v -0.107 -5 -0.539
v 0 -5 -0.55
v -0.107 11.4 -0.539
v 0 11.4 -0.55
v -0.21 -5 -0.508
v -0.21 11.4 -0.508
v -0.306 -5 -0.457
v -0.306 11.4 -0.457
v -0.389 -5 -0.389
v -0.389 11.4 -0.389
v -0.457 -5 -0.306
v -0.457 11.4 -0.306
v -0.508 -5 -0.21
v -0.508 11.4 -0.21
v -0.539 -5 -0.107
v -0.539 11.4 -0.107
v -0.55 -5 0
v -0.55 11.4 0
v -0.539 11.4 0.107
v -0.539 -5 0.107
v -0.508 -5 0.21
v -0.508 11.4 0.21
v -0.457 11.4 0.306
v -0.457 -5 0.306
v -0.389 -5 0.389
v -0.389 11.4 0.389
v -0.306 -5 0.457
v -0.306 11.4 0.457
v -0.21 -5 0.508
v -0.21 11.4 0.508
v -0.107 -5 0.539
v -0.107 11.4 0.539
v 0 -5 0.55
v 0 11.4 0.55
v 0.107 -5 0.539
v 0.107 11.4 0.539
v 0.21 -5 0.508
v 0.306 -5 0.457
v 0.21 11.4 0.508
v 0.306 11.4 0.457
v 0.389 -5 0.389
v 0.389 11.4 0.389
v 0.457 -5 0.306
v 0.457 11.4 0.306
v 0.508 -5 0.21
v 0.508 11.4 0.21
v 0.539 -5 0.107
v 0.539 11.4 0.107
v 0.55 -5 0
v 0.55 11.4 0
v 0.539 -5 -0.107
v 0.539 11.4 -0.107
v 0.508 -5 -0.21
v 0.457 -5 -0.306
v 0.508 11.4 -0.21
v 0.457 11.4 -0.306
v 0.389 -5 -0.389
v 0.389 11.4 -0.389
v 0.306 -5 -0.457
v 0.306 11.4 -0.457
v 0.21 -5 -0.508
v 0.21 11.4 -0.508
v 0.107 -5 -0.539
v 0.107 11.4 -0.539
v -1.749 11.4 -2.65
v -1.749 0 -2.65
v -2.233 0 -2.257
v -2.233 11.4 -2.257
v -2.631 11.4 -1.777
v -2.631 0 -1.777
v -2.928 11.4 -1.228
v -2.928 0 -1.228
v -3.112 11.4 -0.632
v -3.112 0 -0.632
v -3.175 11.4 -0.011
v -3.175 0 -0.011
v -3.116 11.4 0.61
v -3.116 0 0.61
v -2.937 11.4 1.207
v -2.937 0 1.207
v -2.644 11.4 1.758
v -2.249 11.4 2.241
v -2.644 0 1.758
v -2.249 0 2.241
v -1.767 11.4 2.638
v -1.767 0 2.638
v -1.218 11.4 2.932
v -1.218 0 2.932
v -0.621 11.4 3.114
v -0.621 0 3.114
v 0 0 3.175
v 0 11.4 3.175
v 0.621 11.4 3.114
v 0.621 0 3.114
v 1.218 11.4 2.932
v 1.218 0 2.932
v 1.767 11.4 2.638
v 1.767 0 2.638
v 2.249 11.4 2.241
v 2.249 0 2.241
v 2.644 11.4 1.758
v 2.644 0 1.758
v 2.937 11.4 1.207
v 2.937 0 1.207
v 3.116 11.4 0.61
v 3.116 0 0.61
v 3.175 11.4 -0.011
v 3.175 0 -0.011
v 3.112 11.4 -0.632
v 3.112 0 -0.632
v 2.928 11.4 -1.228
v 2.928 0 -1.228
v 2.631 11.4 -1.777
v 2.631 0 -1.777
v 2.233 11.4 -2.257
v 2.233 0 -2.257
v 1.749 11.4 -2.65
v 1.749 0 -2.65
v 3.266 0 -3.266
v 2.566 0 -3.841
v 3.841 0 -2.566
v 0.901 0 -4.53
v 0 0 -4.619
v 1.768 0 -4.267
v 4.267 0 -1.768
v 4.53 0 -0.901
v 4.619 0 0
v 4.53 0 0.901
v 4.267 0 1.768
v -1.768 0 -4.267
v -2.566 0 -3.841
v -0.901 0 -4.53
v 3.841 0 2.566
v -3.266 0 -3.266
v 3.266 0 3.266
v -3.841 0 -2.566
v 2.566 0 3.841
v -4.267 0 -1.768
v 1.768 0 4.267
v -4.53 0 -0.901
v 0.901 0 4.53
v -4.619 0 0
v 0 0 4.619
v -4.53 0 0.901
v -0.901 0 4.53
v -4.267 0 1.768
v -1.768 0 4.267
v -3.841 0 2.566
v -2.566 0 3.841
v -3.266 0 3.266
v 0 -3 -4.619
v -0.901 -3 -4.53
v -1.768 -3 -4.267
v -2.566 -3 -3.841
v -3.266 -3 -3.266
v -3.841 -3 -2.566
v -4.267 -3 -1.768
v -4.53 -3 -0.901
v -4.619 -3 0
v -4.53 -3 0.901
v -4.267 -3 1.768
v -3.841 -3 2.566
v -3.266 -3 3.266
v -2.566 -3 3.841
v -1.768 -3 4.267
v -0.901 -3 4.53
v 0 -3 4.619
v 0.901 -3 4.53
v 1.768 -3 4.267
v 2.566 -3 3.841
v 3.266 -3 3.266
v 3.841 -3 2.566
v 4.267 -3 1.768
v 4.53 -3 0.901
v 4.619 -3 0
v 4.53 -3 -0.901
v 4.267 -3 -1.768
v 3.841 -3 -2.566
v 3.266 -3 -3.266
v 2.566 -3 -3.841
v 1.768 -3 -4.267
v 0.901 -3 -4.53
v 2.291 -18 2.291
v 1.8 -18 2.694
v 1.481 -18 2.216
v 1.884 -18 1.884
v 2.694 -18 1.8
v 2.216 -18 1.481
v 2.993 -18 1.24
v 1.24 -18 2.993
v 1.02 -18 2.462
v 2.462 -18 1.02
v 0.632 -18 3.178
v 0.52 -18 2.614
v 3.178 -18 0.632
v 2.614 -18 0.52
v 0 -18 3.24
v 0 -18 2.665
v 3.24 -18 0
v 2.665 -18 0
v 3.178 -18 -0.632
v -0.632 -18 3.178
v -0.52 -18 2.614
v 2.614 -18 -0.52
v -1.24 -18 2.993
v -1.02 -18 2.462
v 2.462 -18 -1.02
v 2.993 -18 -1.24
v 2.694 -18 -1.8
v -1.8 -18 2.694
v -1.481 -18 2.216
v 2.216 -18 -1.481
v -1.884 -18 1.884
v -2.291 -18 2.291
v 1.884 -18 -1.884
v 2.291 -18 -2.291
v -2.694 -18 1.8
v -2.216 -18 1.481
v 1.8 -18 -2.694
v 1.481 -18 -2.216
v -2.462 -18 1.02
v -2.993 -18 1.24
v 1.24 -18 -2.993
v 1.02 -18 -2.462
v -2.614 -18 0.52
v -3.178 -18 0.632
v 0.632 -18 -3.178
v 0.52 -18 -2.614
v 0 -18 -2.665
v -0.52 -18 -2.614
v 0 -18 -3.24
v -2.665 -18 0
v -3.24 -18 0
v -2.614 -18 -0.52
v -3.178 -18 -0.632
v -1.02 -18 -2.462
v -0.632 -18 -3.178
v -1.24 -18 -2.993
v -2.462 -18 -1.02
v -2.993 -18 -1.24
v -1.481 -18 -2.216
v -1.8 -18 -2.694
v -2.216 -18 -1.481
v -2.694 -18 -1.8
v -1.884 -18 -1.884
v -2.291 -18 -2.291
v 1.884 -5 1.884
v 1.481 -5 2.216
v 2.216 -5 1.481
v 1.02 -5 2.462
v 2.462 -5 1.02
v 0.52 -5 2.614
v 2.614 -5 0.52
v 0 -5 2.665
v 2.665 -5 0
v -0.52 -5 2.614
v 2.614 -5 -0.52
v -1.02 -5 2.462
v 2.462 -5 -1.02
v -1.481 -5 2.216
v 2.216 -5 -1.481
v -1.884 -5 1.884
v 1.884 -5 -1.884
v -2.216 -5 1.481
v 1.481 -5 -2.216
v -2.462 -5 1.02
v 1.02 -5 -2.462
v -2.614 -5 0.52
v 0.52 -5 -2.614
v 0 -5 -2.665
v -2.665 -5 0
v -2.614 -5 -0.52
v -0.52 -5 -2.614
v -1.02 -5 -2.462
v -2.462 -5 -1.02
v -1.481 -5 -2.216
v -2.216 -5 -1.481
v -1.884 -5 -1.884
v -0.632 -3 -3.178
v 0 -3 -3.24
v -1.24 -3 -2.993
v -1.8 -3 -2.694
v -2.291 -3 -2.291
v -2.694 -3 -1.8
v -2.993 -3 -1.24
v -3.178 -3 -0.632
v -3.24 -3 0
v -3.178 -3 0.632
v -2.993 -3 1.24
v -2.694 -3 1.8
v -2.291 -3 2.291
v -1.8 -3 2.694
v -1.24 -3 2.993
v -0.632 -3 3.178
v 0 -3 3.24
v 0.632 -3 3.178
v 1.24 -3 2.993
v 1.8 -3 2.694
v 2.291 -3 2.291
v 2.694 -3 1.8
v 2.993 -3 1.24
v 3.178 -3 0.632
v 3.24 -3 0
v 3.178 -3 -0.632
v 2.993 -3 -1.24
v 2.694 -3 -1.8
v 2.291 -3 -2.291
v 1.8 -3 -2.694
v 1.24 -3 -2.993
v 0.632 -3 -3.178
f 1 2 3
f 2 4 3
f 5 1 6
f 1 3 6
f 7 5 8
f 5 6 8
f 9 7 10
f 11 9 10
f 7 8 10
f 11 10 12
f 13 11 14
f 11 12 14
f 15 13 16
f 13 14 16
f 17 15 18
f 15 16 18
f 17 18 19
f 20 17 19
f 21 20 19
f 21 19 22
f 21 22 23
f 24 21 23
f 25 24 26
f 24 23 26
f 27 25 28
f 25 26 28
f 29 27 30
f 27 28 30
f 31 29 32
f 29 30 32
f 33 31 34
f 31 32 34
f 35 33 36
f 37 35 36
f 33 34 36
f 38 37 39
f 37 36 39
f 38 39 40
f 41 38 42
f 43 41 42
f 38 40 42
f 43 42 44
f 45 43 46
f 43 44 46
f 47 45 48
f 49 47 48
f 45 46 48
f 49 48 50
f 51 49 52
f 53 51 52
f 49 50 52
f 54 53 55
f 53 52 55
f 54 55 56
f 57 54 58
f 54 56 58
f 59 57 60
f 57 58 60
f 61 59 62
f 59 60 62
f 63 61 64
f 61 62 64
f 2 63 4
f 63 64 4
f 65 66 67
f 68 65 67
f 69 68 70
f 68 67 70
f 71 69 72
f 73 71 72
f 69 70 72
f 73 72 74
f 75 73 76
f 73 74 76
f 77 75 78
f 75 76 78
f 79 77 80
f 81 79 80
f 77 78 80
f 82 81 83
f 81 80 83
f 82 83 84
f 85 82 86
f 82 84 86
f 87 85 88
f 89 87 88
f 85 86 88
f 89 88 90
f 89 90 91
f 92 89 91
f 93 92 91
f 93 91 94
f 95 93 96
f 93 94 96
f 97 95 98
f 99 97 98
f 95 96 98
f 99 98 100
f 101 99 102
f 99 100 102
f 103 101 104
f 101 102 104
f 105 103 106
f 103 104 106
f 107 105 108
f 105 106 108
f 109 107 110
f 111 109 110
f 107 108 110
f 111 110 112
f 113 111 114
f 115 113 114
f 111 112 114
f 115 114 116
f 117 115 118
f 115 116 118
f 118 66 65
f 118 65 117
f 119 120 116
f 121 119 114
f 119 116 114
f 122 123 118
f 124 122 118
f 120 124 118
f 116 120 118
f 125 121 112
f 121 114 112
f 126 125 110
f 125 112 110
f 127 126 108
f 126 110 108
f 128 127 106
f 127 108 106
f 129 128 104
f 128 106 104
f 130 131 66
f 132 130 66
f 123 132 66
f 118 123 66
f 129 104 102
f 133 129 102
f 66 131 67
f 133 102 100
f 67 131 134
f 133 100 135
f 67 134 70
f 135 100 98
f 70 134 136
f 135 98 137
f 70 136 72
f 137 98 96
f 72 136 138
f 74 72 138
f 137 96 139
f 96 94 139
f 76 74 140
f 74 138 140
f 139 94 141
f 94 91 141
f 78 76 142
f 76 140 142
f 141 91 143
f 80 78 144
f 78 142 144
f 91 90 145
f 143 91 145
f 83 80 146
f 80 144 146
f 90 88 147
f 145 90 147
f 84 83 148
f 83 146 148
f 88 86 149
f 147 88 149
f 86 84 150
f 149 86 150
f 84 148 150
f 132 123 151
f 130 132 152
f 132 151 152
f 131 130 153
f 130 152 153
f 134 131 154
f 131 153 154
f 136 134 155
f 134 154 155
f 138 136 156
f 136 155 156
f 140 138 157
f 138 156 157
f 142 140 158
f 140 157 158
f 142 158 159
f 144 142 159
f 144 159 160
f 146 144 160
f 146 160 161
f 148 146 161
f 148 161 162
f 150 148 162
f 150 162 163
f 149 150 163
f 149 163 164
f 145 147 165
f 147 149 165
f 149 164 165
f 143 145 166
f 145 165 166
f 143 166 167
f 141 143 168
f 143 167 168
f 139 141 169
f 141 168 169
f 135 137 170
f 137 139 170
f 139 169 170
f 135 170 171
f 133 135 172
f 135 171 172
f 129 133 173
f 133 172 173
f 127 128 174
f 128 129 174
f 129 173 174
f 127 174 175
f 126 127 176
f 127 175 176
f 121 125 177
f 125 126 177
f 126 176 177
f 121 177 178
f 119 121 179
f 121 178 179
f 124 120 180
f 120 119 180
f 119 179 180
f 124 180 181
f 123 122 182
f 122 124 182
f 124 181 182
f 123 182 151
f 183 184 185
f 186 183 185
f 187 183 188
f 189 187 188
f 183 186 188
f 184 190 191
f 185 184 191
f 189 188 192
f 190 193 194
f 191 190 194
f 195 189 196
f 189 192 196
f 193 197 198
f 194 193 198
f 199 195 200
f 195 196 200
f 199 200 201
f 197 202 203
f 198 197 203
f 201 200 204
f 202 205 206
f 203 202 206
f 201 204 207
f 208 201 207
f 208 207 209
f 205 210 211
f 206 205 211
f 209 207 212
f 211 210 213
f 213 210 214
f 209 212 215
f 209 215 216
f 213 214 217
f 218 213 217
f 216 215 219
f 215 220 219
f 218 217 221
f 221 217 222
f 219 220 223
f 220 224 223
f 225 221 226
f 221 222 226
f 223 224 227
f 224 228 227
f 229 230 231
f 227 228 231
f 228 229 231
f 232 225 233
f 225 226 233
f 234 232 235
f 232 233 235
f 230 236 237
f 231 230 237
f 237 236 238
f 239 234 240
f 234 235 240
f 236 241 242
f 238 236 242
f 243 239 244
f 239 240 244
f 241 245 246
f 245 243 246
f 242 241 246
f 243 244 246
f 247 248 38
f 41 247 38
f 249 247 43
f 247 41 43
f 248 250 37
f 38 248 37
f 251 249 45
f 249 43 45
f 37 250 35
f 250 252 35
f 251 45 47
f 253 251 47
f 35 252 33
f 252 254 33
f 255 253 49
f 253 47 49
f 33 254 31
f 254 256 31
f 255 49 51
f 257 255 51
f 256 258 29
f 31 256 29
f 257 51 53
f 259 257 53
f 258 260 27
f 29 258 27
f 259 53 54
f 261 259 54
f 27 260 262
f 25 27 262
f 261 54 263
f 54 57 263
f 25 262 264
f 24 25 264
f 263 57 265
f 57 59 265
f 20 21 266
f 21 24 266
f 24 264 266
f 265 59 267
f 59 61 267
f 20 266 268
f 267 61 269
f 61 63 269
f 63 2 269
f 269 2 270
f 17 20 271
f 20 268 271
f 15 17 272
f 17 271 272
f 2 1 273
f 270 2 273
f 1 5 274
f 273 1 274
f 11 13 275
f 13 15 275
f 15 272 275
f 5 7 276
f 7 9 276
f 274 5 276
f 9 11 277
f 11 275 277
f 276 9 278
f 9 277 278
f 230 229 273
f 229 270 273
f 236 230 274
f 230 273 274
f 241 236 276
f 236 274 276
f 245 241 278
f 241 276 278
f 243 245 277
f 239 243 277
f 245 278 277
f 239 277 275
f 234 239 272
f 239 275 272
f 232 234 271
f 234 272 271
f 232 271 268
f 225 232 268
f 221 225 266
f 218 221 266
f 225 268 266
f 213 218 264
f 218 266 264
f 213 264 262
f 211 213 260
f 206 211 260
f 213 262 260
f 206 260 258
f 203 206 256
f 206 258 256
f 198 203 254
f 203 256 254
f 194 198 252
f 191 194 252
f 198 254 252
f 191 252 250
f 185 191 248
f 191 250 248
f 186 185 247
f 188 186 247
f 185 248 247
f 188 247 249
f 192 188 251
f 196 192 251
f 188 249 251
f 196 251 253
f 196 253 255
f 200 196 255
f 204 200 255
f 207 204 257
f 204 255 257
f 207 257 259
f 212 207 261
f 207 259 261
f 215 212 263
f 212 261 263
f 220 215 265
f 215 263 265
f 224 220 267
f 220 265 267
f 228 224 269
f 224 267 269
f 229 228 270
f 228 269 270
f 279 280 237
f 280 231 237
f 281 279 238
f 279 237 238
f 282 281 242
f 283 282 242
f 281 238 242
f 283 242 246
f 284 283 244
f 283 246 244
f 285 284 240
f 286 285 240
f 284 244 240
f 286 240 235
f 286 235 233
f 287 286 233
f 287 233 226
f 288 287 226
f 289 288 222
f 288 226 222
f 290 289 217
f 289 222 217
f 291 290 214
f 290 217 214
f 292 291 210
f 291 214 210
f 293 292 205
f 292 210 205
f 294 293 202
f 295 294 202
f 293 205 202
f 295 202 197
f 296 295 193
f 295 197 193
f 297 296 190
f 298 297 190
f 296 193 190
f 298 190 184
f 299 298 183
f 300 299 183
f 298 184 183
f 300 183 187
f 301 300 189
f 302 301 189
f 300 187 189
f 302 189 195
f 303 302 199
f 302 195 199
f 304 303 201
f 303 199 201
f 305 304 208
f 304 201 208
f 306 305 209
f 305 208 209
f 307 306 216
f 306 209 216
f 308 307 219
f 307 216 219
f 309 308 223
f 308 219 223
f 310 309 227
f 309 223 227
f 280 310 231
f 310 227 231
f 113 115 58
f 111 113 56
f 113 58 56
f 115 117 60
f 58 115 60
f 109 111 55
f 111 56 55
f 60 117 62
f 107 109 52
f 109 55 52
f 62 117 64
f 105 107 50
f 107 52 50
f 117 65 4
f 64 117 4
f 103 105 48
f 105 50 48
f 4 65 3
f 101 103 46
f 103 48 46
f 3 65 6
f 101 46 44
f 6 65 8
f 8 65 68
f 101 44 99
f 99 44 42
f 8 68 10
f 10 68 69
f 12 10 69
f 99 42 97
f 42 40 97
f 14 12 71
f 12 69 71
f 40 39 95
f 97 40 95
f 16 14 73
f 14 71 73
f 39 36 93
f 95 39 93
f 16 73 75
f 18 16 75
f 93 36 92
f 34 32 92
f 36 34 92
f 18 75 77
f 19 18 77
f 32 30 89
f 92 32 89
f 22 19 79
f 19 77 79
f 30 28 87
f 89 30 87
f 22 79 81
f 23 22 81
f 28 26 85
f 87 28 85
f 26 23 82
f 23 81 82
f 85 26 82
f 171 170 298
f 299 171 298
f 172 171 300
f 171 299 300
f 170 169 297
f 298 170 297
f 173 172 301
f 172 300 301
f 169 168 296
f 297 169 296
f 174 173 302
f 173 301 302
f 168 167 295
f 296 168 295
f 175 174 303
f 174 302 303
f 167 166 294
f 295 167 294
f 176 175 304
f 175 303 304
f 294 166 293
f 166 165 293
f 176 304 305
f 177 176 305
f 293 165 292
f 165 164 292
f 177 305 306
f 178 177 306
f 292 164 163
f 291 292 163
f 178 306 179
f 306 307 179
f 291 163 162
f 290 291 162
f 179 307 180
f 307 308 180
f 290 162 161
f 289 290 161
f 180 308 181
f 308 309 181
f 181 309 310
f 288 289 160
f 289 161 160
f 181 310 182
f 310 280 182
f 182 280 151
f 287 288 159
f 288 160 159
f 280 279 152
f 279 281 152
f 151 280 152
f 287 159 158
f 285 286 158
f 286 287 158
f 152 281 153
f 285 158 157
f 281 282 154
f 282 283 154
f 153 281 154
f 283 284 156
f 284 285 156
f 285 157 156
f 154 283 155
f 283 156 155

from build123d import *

# Parameters (mm, degrees)
PACKAGING_START                     = -2.65
SKETCH2_W                           = 8
SKETCH2_H                           = 11.4
PACKAGING_FLAT_AT_Z_MINUS2P65_DEPTH = 20


with BuildPart() as part:
    # Sketch1 → Revolve1 (revolve)
    with BuildSketch(Plane.XY, mode=Mode.PRIVATE) as revolve1_sk:
        Polygon((2.665, -18), (2.665, -5), (0.55, -5), (0.55, 11.4), (3.175, 11.4), (3.175, 0), (4.619, 0), (4.619, -3), (3.24, -3), (3.24, -18), align=None)
    revolve(revolve1_sk.sketch.rotate(Axis((0, -200, 0), (0, 1, 0)), 90), axis=Axis((0, -200, 0), (0, 1, 0)))

    # Sketch2 → Packaging flat at Z minus2p65 (cut)
    with BuildSketch(Plane.XY.offset(PACKAGING_START)):
        with Locations((0, 5.7)):
            Rectangle(SKETCH2_W, SKETCH2_H)
    extrude(amount=-PACKAGING_FLAT_AT_Z_MINUS2P65_DEPTH, mode=Mode.SUBTRACT)


solid = part.part
